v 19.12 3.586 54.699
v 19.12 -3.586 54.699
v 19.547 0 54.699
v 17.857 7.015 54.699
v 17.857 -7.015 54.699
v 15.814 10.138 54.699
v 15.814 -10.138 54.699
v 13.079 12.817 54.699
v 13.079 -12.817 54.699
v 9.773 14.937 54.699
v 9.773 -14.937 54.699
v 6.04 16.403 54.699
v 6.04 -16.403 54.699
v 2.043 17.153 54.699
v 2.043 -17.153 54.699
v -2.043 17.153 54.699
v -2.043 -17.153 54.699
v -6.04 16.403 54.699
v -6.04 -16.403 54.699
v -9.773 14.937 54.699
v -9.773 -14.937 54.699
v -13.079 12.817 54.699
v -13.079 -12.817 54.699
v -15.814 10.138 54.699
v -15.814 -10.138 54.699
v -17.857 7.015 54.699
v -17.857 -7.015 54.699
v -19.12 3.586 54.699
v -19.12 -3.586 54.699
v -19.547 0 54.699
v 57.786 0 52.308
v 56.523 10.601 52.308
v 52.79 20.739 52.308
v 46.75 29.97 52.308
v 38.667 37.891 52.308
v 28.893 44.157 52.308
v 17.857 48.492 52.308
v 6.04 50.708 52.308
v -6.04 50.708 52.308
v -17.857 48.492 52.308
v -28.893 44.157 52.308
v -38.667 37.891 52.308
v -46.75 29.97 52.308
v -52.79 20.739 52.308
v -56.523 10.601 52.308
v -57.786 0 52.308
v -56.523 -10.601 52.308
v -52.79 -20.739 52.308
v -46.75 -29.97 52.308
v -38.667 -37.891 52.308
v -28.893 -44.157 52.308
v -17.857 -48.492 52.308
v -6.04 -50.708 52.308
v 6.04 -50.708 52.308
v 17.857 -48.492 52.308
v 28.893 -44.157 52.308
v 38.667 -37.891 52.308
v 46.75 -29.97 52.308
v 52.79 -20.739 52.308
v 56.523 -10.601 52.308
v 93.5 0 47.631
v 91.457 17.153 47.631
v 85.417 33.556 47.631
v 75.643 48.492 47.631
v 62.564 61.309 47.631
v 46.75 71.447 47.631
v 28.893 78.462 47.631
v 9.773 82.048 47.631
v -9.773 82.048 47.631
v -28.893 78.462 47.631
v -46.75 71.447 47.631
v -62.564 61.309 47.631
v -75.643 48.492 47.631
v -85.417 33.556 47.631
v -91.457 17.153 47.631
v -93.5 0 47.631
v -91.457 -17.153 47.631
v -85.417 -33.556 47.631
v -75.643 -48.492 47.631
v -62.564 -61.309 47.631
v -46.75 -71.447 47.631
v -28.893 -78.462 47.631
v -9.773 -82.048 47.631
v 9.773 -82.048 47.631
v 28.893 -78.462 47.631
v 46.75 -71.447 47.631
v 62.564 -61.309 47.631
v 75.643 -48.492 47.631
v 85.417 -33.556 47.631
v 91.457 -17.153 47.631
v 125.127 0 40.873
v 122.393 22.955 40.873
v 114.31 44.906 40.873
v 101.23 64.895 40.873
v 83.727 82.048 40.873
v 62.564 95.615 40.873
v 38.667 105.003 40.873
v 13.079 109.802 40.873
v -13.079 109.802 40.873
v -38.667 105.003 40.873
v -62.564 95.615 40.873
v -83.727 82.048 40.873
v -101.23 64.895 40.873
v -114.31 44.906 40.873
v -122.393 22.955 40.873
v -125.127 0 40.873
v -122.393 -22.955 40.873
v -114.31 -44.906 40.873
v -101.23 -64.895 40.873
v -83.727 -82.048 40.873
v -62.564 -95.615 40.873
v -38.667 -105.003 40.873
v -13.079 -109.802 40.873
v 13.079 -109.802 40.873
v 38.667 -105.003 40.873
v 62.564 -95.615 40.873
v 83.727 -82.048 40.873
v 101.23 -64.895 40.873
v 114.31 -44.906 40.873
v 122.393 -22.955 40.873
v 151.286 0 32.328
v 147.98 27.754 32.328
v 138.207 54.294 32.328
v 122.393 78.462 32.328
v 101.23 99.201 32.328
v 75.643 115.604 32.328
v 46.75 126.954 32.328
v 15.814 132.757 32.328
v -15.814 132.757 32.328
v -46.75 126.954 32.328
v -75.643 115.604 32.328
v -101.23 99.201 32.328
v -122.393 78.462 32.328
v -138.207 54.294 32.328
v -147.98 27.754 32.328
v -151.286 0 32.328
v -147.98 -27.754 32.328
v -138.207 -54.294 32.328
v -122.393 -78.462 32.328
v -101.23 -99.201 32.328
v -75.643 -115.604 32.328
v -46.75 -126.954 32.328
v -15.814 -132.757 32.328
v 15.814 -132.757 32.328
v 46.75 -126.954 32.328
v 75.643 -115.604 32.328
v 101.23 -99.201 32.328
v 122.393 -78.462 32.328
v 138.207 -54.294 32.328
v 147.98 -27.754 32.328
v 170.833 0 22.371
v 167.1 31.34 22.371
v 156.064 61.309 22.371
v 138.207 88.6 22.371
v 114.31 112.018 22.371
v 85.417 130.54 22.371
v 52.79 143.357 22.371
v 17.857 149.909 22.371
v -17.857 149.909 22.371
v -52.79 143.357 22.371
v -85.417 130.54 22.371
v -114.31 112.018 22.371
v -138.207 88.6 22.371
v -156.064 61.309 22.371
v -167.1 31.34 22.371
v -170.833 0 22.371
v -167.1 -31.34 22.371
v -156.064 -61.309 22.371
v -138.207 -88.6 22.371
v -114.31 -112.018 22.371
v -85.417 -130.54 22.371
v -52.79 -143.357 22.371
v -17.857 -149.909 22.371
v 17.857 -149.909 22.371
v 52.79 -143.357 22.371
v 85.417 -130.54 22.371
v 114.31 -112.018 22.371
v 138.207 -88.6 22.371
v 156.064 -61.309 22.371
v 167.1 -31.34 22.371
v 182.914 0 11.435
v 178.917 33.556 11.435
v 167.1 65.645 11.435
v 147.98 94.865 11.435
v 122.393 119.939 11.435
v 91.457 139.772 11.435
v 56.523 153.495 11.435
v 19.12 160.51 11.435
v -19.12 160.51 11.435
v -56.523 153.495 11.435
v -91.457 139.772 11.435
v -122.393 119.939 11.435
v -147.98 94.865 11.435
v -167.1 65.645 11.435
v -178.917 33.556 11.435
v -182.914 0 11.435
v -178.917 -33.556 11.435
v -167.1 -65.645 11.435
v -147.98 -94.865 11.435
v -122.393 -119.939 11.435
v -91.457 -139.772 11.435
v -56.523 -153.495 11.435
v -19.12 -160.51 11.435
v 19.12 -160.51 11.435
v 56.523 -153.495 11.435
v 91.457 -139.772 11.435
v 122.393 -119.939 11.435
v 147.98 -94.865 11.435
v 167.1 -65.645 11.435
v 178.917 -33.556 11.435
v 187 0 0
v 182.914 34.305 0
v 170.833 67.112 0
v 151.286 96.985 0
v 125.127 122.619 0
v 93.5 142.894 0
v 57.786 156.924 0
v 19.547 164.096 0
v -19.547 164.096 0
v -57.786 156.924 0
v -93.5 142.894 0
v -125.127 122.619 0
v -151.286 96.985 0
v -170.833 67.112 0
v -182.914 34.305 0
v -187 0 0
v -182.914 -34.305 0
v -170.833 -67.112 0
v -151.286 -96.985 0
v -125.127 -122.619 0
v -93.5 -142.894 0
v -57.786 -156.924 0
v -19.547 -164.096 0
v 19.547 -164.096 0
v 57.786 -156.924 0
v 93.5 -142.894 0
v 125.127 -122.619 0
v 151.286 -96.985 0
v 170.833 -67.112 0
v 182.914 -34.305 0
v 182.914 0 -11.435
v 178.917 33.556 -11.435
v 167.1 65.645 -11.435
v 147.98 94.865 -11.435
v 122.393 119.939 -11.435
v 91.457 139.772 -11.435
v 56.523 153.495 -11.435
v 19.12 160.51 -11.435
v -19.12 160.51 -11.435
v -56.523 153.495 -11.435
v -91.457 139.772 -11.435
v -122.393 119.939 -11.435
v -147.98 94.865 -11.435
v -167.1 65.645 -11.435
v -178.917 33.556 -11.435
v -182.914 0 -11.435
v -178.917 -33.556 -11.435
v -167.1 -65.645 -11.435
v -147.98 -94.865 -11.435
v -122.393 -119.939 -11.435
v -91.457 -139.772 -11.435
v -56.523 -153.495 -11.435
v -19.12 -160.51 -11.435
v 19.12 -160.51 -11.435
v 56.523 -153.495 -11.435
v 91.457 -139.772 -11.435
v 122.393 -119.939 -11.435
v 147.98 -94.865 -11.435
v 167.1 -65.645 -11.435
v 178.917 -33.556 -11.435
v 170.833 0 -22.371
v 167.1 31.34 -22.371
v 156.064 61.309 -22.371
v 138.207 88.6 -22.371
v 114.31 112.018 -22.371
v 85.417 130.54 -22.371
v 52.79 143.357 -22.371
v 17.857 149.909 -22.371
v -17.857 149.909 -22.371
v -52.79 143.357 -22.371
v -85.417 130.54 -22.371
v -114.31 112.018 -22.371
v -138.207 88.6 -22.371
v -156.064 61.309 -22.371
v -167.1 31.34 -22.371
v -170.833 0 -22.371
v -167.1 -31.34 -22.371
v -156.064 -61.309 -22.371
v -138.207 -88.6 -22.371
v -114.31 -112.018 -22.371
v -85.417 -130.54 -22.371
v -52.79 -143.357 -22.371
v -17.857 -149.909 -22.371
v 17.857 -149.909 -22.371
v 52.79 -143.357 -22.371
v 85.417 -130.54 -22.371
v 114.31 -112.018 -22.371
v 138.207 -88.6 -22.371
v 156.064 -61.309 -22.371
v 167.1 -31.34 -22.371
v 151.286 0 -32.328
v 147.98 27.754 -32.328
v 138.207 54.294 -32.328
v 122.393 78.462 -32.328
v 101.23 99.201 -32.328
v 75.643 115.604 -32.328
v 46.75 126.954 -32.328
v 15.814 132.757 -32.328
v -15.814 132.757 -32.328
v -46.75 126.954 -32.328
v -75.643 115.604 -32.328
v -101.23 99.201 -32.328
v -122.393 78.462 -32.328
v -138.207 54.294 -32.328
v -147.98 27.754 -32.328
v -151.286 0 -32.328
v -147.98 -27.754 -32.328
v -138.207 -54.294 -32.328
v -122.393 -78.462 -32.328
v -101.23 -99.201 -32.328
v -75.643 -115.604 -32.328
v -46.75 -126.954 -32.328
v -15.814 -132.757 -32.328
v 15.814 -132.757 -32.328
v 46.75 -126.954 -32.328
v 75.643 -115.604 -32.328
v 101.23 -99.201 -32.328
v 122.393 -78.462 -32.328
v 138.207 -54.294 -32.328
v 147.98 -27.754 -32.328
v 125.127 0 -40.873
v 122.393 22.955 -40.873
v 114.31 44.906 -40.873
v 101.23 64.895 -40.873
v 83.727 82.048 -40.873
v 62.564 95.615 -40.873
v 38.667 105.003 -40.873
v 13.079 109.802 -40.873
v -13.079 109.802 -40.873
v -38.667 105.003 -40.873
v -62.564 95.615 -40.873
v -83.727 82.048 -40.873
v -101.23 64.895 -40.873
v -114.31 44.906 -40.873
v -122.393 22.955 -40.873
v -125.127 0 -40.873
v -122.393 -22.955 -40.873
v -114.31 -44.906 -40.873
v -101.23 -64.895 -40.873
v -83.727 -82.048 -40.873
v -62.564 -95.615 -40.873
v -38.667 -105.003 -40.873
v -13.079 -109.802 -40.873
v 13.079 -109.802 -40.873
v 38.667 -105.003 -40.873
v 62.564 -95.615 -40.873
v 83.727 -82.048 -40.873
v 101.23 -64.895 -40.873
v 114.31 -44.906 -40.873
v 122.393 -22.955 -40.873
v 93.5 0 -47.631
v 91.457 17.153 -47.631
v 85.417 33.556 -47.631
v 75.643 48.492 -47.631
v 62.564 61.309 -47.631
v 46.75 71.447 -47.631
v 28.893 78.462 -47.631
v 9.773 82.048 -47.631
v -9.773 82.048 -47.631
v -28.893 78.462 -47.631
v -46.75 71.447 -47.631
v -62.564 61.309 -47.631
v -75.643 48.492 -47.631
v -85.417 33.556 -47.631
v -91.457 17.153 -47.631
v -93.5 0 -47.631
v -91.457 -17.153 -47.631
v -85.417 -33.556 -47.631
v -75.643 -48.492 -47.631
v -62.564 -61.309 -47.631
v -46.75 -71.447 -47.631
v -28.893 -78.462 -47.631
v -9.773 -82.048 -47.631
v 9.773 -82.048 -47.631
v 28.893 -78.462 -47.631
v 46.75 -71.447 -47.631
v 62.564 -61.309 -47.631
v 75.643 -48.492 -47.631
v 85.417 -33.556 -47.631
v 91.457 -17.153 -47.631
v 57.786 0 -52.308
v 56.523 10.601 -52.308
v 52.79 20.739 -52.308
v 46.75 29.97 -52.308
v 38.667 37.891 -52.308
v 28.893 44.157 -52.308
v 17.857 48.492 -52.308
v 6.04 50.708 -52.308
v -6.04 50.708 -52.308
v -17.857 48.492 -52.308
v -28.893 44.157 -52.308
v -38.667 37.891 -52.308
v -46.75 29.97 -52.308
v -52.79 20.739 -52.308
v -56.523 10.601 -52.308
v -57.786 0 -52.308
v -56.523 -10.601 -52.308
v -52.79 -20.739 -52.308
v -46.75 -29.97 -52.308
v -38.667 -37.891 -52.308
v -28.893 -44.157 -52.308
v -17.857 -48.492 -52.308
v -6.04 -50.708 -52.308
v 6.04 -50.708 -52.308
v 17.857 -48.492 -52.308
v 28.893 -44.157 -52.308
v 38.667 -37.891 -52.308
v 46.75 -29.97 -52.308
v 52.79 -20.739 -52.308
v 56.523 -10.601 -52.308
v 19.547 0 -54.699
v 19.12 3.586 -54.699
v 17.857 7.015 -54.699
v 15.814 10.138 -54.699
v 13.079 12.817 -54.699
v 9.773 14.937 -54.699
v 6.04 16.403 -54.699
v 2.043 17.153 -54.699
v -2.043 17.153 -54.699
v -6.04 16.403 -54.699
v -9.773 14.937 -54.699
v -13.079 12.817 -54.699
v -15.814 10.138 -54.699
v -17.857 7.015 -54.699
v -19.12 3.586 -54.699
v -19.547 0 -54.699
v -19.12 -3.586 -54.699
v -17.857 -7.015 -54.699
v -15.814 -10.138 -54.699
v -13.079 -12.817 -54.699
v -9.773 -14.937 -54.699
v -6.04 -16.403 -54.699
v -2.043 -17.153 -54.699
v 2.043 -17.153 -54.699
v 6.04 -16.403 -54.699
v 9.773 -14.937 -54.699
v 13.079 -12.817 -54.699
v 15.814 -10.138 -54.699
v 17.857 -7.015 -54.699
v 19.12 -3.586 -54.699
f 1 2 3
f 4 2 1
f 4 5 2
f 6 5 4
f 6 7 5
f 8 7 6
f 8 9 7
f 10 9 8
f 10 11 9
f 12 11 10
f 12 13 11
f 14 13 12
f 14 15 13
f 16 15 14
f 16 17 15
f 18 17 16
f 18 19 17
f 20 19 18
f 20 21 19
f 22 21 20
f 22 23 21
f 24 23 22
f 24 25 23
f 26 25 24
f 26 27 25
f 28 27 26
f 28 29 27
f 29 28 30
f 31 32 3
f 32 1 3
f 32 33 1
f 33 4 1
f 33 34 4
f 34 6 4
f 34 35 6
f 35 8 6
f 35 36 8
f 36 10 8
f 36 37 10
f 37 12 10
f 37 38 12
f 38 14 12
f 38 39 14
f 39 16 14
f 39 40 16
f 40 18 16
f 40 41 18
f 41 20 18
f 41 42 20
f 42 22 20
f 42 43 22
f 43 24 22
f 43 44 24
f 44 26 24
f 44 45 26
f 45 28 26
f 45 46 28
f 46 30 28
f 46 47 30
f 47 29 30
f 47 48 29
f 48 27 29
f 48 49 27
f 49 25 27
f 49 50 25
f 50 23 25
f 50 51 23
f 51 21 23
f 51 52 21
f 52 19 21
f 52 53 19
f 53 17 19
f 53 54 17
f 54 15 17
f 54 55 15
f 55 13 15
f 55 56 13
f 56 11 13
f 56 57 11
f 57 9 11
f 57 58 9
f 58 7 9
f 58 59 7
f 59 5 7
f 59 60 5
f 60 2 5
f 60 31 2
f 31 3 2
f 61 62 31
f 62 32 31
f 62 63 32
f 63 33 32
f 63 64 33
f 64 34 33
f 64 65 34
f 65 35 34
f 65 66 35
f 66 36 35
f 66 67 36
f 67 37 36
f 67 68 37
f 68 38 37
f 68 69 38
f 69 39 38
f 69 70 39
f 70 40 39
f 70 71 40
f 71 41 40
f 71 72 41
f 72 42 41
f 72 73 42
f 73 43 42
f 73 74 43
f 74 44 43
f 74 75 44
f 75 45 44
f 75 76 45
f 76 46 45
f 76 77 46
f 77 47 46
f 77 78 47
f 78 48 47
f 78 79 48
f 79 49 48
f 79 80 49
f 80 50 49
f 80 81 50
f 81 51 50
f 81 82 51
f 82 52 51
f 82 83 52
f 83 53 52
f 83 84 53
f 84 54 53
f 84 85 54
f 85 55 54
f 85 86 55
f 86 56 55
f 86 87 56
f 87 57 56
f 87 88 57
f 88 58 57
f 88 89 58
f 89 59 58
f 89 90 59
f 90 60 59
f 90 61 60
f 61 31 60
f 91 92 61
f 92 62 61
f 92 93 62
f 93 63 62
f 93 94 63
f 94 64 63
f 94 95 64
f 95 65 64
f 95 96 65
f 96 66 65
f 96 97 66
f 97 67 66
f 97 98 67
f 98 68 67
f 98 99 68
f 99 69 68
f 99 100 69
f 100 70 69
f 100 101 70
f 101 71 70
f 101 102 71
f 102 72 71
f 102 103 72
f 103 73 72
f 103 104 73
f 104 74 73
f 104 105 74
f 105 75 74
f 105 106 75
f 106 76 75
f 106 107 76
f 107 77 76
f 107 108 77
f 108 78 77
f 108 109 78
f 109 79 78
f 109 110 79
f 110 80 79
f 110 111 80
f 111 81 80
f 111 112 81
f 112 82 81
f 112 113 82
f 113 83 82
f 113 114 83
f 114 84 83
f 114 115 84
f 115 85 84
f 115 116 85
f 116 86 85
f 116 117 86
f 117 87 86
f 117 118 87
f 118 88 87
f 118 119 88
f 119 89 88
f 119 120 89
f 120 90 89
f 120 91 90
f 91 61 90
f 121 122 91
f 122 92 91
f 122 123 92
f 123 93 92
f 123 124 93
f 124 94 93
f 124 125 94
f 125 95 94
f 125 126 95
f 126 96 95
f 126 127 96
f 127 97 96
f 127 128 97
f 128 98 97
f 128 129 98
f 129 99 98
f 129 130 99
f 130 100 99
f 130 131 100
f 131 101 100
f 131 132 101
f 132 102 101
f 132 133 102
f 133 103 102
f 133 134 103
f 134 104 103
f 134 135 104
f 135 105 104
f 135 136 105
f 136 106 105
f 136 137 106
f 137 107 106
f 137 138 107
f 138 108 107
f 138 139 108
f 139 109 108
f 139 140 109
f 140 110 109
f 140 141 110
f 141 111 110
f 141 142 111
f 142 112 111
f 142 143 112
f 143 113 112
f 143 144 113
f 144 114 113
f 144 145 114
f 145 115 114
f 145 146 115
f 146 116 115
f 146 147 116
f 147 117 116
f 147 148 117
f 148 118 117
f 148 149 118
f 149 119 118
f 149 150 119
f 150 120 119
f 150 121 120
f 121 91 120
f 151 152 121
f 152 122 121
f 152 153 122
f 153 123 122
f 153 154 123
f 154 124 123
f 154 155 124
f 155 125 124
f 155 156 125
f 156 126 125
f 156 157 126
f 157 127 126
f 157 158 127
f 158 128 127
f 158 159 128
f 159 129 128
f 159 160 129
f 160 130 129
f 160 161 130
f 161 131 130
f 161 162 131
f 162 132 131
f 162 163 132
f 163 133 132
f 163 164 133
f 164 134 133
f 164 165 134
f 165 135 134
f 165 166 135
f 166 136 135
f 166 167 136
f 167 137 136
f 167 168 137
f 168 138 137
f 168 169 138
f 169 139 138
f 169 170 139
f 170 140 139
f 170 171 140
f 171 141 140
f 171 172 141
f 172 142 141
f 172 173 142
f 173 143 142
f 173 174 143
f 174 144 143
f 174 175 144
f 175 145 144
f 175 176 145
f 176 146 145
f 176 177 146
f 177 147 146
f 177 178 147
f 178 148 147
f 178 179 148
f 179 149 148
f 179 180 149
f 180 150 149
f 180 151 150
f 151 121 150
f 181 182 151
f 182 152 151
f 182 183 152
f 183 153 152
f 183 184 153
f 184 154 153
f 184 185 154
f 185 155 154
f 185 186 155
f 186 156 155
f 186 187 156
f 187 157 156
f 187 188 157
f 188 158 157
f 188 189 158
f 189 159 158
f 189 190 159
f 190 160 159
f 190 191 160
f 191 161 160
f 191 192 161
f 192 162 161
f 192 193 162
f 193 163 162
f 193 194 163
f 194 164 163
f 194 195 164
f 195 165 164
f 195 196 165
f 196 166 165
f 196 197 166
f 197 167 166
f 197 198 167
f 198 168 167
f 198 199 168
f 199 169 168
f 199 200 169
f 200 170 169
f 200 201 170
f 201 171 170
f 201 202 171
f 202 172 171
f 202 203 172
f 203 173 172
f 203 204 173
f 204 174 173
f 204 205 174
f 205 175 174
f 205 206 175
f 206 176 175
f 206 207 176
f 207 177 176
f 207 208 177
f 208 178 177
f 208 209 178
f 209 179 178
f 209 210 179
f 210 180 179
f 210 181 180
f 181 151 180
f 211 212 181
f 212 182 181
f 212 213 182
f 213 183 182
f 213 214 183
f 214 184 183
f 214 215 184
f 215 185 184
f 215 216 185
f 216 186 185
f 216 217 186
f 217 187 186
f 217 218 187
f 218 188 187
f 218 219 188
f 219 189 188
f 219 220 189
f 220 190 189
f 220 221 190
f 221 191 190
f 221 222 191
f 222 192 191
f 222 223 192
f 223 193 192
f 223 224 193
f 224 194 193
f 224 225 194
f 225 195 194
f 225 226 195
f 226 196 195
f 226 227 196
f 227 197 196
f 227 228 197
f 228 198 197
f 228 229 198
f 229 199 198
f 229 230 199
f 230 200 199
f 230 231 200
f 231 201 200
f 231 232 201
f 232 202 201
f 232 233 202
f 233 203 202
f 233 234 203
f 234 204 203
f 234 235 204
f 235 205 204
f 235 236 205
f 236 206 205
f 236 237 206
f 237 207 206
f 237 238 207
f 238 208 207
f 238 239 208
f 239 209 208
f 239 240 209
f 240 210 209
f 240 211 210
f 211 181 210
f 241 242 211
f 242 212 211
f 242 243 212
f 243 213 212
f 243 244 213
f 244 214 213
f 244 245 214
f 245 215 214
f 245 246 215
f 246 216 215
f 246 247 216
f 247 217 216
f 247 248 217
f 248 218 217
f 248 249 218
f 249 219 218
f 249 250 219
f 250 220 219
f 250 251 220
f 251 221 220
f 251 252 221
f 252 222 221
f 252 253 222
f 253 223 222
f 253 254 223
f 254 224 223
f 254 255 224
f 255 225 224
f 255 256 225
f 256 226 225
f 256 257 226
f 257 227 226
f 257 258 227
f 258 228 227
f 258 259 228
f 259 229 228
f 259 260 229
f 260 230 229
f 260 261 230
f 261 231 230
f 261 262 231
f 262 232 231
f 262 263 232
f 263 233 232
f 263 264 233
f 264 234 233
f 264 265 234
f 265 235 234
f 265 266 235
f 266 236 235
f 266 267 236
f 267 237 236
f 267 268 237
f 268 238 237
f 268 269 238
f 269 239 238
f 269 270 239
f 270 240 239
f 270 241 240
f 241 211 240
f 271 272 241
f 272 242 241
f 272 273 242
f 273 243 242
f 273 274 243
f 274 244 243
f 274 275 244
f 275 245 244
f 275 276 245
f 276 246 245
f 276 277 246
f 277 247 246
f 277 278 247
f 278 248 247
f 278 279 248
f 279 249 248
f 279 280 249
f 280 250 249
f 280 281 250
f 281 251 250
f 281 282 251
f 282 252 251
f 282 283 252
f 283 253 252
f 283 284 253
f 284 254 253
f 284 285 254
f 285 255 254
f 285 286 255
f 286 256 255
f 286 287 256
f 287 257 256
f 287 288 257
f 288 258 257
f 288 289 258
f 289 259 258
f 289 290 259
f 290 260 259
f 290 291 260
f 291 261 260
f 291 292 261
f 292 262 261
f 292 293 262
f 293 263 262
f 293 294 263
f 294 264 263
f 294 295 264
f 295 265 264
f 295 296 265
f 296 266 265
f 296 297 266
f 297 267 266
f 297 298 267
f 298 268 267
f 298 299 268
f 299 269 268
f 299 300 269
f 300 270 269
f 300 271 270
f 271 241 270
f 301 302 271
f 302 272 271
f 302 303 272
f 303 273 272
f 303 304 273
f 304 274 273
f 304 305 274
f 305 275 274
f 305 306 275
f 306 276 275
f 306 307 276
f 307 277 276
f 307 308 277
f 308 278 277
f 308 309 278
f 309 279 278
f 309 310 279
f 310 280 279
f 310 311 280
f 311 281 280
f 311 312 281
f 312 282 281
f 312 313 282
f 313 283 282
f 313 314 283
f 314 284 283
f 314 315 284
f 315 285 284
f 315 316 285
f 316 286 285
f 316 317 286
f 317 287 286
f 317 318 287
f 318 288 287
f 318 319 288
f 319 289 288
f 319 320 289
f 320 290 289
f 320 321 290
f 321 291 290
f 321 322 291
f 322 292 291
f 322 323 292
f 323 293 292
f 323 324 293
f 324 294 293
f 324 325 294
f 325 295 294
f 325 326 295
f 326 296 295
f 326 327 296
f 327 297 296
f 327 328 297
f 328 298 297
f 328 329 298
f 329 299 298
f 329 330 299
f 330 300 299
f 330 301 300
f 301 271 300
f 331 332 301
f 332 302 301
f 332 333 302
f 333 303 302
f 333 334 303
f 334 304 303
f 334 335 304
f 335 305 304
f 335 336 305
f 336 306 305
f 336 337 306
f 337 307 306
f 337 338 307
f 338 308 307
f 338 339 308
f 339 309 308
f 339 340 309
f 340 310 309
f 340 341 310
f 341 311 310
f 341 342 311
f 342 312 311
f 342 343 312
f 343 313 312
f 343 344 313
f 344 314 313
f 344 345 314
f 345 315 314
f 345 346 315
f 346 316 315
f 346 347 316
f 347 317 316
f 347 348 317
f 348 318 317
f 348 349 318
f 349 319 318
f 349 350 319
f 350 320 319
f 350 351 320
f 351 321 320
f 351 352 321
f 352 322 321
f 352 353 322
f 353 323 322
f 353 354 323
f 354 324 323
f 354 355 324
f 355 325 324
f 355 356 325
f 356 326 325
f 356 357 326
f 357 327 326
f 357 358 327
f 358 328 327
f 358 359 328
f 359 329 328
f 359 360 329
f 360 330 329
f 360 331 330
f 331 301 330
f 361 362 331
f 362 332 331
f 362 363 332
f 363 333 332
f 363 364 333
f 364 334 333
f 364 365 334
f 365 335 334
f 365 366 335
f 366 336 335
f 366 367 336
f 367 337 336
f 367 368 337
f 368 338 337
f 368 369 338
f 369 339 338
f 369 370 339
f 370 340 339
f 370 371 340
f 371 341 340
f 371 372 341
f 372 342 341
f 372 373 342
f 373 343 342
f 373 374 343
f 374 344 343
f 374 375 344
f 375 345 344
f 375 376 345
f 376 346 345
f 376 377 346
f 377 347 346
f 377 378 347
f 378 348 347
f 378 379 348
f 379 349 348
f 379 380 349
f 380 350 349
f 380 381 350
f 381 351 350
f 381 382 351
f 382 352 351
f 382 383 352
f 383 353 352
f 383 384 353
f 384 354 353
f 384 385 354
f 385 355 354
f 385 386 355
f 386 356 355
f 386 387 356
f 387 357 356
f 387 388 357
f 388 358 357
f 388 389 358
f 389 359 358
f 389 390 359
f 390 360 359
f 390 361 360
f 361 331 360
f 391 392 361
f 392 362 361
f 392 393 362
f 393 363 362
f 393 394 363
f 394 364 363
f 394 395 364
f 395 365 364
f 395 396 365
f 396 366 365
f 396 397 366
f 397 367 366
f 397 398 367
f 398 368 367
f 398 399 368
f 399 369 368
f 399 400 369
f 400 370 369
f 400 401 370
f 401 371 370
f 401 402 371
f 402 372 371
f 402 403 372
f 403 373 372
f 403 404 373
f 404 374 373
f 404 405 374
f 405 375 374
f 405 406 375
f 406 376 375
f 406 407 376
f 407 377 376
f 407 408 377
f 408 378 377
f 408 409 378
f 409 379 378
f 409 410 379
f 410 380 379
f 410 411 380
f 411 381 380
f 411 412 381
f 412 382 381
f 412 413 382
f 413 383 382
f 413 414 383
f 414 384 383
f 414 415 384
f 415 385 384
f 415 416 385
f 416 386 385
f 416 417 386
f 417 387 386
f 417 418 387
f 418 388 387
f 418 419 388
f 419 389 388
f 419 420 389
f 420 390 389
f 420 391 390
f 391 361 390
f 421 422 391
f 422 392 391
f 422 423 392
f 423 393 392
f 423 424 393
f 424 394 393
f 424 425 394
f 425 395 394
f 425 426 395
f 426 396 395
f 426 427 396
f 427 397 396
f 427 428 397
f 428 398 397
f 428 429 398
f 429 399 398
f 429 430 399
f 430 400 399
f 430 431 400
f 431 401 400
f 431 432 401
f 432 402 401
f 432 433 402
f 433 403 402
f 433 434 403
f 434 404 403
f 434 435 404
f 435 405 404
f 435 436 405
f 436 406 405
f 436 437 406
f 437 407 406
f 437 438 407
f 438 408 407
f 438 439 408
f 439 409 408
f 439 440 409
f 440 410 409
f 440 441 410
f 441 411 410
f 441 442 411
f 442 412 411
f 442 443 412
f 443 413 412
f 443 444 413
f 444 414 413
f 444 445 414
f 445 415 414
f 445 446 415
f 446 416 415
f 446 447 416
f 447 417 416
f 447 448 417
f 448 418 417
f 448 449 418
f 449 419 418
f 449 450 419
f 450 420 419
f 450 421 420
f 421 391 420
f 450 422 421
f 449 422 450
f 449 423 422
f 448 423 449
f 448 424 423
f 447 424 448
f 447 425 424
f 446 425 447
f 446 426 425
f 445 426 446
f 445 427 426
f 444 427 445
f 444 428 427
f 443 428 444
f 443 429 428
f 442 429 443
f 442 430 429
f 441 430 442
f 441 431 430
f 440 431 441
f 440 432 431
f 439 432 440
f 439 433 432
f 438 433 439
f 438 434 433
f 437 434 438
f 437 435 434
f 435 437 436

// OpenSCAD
// Generated by SolidPython 1.0.1 on 2020-07-29 00:46:53


scale(v = [17, 15, 5]) {
	sphere(r = 11);
}
/***********************************************
*********      SolidPython code:      **********
************************************************
 
# import packages: SolidPython
from solid import *
from solid.utils import *
from itertools import chain, combinations, permutations


class Resize:

    def __init__(self, scad_file):
        self.scad_file = scad_file
        #self.scad_file = import_scad(scad_file)
        # cone/cylinder param:
        self.r1 = 0
        self.r2 = 0
        self.h = 0
        # rectangular prism param:
        self.w = 0
        self.l = 0
        # ellipse param:
        self.r = 0

    # import OpenScad code (file name corresponds to shape)


    # classify shape + parameters
    def assign(self, param1, param2, param3):
        if self.scad_file == 'cone.scad':
            self.r1 = param1
            self.r2 = param2
            self.h = param3
        elif self.scad_file == 'cylinder.scad':
            self.r1 = param1
            self.r2 = param2
            self.h = param3
        elif self.scad_file == 'rectangularPrism.scad':
            self.h = param1
            self.l = param2
            self.w = param3
        else:
            self.r = param1
            self.h = param2

    # resize parameters
    def iterate(self):
        x = range(3, 20, 2)
        i = 1
        if self.scad_file == 'cone.scad':
            tempList = list(permutations(x, 2))
            for temp in tempList:
                param1 = temp[0]
                param2 = temp[1]
                filepath = 'produced_scad_files/' + 'cone' + str(param1) + '_' + str(param2) + '_' + '.scad'
                scad_render_to_file(cylinder(h=param1, r1=param2, r2=0), filepath)

        elif self.scad_file == 'cylinder.scad':
            tempList = list(permutations(x, 3))
            for temp in tempList:
                param1 = temp[0]
                param2 = temp[1]
                filepath = 'produced_scad_files/' + 'cylinder' + str(param1) + '_' + str(param2) + '_' + '.scad'
                scad_render_to_file(cylinder(h=param1, r1=param2, r2=param2), filepath)

        elif self.scad_file == 'rectangularPrism.scad':
            tempList = list(permutations(x, 3))
            for temp in tempList:
                param1 = temp[0]
                param2 = temp[1]
                param3 = temp[2]
                filepath = 'produced_scad_files/' + 'rectangularPrism' + str(param1) + '_' + str(param2) + '_' + str(
                    param3) + '.scad'
                scad_render_to_file(cube(size=(param1, param2, param3)), filepath)

        elif self.scad_file == 'ellipse.scad':
            tempList = list(permutations(x, 4))
            for temp in tempList:
                param1 = temp[0]
                param2 = temp[1]
                param3 = temp[2]
                param4 = temp[3]
                filepath = 'produced_scad_files/' + 'ellipse' + str(param1) + '_' + str(param2) + '_' + str(param3) + '_' + str(param4) + '.scad'
                scad_render_to_file(scale([param1, param2, param3])(sphere(r=param4)), filepath)

    def render_to_scadfile(self):
        scad_render_to_file(scad, 'example.scad') 
 
************************************************/
